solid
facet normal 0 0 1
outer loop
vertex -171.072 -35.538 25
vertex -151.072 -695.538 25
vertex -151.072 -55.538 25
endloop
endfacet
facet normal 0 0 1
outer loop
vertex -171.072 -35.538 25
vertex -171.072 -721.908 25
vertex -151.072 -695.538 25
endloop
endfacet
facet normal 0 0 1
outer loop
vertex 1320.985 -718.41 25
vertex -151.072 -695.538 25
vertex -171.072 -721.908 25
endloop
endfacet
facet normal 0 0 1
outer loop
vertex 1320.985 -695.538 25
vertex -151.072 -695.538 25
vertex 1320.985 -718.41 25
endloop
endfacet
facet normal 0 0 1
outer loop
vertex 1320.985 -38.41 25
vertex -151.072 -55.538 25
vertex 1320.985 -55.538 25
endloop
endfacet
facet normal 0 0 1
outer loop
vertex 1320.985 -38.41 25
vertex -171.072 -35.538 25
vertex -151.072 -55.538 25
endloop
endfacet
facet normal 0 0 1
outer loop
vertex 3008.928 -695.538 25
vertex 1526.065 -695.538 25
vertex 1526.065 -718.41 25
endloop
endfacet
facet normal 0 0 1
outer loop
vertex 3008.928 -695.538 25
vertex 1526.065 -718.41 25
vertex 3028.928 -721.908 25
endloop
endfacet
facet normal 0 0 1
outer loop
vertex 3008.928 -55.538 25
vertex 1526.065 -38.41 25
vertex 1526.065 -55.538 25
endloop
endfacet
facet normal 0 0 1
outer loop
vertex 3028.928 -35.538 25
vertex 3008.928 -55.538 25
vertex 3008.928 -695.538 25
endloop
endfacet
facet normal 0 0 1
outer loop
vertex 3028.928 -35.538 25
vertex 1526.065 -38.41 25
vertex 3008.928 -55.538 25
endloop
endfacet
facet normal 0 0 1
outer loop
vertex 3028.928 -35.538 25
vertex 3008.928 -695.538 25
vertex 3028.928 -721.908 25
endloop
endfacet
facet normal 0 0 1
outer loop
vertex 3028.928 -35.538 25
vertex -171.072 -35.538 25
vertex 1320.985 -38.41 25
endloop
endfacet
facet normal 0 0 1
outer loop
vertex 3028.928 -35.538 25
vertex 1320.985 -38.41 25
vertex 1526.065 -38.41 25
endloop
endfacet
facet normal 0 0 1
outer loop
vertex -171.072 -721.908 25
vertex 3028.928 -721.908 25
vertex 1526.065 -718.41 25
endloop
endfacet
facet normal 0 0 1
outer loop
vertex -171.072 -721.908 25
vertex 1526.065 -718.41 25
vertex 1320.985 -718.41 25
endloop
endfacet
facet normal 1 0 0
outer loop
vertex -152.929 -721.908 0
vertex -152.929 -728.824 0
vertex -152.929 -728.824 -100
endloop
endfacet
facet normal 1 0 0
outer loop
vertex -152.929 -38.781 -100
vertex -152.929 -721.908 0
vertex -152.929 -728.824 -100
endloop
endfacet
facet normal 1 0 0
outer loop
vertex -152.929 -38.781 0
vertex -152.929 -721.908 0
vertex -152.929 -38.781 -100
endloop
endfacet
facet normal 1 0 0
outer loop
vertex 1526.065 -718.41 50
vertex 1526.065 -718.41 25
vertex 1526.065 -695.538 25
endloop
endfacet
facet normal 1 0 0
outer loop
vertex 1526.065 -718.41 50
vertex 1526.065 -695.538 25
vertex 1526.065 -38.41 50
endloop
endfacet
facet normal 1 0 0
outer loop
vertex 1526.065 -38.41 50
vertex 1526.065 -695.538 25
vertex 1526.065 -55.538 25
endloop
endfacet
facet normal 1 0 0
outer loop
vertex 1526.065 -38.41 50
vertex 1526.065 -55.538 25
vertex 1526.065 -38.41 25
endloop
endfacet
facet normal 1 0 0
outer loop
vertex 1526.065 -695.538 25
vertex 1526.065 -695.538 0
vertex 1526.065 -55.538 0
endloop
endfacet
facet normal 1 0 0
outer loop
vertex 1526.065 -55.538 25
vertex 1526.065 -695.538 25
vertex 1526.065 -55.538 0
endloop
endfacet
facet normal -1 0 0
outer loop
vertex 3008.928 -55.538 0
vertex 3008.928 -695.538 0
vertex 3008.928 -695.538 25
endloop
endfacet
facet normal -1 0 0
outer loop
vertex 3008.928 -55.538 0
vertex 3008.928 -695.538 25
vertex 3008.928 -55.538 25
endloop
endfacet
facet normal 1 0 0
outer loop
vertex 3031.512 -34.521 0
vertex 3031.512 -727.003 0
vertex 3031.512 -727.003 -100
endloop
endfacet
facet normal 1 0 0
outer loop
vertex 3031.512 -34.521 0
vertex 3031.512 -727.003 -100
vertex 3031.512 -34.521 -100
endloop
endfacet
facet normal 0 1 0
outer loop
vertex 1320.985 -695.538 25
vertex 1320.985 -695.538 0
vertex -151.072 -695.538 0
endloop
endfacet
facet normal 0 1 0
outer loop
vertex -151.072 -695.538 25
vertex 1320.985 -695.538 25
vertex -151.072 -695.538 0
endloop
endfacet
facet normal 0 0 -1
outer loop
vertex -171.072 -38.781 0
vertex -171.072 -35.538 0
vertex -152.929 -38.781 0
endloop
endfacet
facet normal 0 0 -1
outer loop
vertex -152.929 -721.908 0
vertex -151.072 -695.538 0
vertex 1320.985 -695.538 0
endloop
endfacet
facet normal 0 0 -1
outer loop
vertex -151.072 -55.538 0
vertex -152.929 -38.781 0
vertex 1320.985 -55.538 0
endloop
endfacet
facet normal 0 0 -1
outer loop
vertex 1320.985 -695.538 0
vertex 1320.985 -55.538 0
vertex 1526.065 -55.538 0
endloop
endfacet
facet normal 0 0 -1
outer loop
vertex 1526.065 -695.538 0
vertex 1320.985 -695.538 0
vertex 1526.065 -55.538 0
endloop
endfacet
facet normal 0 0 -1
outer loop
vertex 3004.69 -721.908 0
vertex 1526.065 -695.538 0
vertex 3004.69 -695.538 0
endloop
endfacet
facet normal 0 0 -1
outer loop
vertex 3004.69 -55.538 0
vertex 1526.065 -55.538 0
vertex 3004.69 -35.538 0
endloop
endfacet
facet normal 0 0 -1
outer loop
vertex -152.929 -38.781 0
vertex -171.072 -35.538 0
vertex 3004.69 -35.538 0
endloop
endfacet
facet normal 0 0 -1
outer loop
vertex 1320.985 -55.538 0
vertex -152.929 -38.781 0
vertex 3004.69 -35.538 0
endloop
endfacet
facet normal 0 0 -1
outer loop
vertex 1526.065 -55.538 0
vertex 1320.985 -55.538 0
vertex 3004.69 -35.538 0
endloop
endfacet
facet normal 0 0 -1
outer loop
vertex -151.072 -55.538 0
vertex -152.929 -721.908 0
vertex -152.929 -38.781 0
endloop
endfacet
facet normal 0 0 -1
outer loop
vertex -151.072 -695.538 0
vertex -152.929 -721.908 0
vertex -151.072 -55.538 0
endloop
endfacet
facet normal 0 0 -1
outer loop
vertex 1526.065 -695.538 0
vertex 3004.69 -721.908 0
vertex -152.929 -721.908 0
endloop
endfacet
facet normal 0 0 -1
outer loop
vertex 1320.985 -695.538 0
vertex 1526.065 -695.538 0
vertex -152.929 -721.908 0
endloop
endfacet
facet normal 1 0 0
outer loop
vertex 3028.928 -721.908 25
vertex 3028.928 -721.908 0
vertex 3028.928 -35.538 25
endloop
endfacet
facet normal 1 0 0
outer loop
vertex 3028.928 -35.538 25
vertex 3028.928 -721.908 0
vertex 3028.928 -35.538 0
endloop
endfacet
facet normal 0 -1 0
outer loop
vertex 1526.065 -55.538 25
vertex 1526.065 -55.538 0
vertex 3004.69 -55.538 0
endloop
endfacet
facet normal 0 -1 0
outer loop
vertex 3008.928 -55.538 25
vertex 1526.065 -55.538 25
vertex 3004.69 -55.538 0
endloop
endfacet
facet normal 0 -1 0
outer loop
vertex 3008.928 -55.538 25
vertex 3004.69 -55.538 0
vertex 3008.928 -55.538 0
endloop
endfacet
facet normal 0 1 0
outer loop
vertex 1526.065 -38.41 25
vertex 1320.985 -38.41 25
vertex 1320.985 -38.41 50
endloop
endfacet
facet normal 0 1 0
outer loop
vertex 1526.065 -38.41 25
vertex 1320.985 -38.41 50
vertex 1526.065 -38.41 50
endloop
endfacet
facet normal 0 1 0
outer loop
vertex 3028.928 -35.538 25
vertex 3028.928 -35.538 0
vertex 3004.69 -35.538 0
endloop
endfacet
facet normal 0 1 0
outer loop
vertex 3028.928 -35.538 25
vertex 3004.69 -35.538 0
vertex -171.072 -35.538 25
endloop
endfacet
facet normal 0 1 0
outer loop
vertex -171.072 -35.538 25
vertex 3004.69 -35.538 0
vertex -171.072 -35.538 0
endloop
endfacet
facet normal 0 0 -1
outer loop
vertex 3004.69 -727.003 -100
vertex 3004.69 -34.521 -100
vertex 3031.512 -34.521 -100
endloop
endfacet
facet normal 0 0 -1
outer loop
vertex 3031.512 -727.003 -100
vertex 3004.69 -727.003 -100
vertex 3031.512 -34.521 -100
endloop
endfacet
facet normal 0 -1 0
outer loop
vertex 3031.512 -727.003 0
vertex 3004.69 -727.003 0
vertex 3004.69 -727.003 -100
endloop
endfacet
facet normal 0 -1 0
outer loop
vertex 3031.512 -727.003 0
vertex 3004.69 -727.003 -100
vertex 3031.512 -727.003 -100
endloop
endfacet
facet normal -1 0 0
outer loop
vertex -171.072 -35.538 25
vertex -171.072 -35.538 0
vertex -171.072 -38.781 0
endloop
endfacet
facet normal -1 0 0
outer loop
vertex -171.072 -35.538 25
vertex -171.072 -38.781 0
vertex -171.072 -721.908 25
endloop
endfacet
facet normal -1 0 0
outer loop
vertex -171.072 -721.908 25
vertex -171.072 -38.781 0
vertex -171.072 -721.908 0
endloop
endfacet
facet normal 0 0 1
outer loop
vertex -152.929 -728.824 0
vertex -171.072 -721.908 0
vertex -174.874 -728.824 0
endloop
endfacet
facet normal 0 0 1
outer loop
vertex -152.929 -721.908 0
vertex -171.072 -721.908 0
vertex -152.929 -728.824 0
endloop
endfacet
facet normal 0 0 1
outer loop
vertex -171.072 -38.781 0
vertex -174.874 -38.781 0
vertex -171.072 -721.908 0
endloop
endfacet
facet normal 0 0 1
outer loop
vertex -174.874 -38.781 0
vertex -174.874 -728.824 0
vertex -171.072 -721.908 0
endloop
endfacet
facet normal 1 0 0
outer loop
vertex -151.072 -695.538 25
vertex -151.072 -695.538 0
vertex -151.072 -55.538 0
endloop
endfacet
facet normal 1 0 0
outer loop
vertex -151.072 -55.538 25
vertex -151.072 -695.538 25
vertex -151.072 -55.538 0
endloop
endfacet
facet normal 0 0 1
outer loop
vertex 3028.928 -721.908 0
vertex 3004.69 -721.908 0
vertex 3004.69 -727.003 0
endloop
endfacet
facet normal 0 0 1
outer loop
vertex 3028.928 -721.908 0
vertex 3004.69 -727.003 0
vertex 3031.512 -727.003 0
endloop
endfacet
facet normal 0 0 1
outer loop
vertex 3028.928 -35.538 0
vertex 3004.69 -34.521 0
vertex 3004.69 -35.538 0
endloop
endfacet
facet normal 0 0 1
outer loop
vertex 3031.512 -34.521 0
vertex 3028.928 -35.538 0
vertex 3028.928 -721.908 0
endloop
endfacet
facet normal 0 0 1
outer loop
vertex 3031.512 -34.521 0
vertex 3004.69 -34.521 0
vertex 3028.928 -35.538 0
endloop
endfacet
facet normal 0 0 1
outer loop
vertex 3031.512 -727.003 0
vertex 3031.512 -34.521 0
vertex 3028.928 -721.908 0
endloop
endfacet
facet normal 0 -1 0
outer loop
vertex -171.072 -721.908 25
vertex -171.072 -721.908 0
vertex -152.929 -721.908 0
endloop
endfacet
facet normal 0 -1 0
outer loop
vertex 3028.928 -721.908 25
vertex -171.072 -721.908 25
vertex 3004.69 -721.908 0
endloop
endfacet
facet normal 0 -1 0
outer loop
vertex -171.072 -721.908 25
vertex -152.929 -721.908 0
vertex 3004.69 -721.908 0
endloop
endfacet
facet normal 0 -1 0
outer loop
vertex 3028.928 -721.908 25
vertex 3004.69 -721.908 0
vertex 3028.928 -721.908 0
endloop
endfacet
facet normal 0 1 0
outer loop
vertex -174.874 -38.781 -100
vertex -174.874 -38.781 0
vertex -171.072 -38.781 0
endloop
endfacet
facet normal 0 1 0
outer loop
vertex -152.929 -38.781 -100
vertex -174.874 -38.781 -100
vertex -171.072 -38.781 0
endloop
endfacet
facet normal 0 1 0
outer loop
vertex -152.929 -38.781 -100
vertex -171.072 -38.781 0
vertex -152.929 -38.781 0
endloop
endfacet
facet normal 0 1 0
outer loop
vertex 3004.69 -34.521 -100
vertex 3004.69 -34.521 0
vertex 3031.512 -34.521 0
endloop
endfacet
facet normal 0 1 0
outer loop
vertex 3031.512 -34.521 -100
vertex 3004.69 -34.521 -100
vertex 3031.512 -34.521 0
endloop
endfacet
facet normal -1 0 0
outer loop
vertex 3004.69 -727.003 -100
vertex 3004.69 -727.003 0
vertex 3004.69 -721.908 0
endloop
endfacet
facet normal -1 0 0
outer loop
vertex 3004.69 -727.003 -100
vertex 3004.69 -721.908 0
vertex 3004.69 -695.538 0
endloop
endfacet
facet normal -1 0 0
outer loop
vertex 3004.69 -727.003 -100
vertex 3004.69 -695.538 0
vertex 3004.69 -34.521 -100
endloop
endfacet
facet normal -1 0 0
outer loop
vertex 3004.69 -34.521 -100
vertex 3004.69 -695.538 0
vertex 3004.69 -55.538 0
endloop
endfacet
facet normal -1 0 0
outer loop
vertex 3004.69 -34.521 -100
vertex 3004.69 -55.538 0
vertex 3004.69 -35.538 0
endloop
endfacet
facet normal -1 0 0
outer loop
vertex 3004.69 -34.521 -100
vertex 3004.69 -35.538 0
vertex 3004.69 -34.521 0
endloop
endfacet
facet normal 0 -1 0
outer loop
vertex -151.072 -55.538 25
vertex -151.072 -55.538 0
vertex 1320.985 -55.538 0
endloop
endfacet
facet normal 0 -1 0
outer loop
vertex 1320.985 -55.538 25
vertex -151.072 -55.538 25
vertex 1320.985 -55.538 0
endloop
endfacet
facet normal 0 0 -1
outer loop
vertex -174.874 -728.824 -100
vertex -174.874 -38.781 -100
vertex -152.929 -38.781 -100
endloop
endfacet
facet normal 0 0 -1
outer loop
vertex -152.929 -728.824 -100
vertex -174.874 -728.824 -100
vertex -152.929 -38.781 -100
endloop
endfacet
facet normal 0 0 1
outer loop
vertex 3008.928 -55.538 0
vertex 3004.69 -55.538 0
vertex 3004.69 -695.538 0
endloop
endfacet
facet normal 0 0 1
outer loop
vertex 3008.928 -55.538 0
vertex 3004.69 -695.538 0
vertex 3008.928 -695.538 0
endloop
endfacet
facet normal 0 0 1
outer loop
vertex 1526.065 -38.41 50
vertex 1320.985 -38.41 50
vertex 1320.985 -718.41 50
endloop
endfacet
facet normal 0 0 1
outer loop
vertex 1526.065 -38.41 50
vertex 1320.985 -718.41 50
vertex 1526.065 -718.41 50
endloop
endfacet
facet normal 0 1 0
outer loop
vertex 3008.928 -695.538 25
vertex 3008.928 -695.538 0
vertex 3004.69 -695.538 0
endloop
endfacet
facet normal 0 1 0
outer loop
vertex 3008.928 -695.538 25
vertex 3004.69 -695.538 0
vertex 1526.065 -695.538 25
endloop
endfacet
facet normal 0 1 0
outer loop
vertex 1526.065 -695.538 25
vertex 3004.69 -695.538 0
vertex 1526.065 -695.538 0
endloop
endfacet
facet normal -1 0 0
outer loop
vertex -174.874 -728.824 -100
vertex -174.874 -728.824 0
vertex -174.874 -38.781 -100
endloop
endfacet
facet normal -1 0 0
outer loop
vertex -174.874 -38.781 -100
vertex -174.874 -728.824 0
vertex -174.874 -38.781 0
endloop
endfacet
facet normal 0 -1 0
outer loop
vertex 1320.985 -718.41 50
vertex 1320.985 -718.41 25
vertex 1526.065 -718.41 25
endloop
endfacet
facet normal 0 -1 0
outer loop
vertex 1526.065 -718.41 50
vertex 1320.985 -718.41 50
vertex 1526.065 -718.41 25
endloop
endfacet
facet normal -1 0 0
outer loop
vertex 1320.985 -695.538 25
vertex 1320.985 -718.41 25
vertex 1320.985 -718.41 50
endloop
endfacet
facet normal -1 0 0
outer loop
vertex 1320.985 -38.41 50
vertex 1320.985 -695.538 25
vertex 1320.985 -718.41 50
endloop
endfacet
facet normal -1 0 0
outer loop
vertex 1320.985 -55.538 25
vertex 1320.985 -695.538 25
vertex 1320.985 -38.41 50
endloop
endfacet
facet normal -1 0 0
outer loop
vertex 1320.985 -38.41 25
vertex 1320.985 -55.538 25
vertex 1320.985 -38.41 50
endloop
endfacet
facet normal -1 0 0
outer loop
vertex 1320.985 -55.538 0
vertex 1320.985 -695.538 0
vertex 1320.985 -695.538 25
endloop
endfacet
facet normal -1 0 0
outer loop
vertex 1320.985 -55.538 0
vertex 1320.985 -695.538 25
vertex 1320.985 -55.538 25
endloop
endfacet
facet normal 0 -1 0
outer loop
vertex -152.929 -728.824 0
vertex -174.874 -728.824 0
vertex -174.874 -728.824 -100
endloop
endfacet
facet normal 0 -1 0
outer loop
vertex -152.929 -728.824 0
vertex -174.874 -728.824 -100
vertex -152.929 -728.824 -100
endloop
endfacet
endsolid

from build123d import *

# Parameters (mm, degrees)
F0_W     = 20
F0_H     = 640
F1_DEPTH = 25
F2_W     = 205.079407
F2_H     = 680
F3_DEPTH = 50
F4_W     = 21.944835
F4_H     = 690.043539
F4_W_2   = 26.821375
F4_H_2   = 692.481876
F5_DEPTH = 100
F6_DEPTH = 100


with BuildPart() as f1:
    # F0 (on Top) → F1 (new body)
    with BuildSketch(Plane.XY):
        Polygon((3028.928354, -35.538424), (-171.071646, -35.538424), (-171.071646, -55.538424), (-151.071646, -55.538424), (3008.928354, -55.538424), (3028.928354, -55.538424), align=None)
        with Locations((-161.071646, -375.538424)):
            Rectangle(F0_W, F0_H)
        with Locations((3018.928354, -375.538424)):
            Rectangle(F0_W, F0_H)
        Polygon((-151.071646, -695.538424), (-171.071646, -695.538424), (-171.071646, -721.908212), (3028.928354, -721.908212), (3028.928354, -695.538424), (3008.928354, -695.538424), align=None)
    extrude(amount=F1_DEPTH)

    # F2 (on Top) → F3 (join)
    with BuildSketch(Plane.XY):
        with Locations((1423.525035, -378.410397)):
            Rectangle(F2_W, F2_H)
    extrude(amount=F3_DEPTH)

    # F4 (on Top) → F5 (join)
    with BuildSketch(Plane.XY):
        with Locations((-163.901783, -383.802428)):
            Rectangle(F4_W, F4_H)
        with Locations((3018.101096, -380.761802)):
            Rectangle(F4_W_2, F4_H_2)
    extrude(amount=-F5_DEPTH)

    # F4 (on Top) → F6 (join)
    with BuildSketch(Plane.XY):
        with Locations((-163.901783, -383.802428)):
            Rectangle(F4_W, F4_H)
        with Locations((3018.101096, -380.761802)):
            Rectangle(F4_W_2, F4_H_2)
    extrude(amount=-F6_DEPTH)


solid = f1.part
